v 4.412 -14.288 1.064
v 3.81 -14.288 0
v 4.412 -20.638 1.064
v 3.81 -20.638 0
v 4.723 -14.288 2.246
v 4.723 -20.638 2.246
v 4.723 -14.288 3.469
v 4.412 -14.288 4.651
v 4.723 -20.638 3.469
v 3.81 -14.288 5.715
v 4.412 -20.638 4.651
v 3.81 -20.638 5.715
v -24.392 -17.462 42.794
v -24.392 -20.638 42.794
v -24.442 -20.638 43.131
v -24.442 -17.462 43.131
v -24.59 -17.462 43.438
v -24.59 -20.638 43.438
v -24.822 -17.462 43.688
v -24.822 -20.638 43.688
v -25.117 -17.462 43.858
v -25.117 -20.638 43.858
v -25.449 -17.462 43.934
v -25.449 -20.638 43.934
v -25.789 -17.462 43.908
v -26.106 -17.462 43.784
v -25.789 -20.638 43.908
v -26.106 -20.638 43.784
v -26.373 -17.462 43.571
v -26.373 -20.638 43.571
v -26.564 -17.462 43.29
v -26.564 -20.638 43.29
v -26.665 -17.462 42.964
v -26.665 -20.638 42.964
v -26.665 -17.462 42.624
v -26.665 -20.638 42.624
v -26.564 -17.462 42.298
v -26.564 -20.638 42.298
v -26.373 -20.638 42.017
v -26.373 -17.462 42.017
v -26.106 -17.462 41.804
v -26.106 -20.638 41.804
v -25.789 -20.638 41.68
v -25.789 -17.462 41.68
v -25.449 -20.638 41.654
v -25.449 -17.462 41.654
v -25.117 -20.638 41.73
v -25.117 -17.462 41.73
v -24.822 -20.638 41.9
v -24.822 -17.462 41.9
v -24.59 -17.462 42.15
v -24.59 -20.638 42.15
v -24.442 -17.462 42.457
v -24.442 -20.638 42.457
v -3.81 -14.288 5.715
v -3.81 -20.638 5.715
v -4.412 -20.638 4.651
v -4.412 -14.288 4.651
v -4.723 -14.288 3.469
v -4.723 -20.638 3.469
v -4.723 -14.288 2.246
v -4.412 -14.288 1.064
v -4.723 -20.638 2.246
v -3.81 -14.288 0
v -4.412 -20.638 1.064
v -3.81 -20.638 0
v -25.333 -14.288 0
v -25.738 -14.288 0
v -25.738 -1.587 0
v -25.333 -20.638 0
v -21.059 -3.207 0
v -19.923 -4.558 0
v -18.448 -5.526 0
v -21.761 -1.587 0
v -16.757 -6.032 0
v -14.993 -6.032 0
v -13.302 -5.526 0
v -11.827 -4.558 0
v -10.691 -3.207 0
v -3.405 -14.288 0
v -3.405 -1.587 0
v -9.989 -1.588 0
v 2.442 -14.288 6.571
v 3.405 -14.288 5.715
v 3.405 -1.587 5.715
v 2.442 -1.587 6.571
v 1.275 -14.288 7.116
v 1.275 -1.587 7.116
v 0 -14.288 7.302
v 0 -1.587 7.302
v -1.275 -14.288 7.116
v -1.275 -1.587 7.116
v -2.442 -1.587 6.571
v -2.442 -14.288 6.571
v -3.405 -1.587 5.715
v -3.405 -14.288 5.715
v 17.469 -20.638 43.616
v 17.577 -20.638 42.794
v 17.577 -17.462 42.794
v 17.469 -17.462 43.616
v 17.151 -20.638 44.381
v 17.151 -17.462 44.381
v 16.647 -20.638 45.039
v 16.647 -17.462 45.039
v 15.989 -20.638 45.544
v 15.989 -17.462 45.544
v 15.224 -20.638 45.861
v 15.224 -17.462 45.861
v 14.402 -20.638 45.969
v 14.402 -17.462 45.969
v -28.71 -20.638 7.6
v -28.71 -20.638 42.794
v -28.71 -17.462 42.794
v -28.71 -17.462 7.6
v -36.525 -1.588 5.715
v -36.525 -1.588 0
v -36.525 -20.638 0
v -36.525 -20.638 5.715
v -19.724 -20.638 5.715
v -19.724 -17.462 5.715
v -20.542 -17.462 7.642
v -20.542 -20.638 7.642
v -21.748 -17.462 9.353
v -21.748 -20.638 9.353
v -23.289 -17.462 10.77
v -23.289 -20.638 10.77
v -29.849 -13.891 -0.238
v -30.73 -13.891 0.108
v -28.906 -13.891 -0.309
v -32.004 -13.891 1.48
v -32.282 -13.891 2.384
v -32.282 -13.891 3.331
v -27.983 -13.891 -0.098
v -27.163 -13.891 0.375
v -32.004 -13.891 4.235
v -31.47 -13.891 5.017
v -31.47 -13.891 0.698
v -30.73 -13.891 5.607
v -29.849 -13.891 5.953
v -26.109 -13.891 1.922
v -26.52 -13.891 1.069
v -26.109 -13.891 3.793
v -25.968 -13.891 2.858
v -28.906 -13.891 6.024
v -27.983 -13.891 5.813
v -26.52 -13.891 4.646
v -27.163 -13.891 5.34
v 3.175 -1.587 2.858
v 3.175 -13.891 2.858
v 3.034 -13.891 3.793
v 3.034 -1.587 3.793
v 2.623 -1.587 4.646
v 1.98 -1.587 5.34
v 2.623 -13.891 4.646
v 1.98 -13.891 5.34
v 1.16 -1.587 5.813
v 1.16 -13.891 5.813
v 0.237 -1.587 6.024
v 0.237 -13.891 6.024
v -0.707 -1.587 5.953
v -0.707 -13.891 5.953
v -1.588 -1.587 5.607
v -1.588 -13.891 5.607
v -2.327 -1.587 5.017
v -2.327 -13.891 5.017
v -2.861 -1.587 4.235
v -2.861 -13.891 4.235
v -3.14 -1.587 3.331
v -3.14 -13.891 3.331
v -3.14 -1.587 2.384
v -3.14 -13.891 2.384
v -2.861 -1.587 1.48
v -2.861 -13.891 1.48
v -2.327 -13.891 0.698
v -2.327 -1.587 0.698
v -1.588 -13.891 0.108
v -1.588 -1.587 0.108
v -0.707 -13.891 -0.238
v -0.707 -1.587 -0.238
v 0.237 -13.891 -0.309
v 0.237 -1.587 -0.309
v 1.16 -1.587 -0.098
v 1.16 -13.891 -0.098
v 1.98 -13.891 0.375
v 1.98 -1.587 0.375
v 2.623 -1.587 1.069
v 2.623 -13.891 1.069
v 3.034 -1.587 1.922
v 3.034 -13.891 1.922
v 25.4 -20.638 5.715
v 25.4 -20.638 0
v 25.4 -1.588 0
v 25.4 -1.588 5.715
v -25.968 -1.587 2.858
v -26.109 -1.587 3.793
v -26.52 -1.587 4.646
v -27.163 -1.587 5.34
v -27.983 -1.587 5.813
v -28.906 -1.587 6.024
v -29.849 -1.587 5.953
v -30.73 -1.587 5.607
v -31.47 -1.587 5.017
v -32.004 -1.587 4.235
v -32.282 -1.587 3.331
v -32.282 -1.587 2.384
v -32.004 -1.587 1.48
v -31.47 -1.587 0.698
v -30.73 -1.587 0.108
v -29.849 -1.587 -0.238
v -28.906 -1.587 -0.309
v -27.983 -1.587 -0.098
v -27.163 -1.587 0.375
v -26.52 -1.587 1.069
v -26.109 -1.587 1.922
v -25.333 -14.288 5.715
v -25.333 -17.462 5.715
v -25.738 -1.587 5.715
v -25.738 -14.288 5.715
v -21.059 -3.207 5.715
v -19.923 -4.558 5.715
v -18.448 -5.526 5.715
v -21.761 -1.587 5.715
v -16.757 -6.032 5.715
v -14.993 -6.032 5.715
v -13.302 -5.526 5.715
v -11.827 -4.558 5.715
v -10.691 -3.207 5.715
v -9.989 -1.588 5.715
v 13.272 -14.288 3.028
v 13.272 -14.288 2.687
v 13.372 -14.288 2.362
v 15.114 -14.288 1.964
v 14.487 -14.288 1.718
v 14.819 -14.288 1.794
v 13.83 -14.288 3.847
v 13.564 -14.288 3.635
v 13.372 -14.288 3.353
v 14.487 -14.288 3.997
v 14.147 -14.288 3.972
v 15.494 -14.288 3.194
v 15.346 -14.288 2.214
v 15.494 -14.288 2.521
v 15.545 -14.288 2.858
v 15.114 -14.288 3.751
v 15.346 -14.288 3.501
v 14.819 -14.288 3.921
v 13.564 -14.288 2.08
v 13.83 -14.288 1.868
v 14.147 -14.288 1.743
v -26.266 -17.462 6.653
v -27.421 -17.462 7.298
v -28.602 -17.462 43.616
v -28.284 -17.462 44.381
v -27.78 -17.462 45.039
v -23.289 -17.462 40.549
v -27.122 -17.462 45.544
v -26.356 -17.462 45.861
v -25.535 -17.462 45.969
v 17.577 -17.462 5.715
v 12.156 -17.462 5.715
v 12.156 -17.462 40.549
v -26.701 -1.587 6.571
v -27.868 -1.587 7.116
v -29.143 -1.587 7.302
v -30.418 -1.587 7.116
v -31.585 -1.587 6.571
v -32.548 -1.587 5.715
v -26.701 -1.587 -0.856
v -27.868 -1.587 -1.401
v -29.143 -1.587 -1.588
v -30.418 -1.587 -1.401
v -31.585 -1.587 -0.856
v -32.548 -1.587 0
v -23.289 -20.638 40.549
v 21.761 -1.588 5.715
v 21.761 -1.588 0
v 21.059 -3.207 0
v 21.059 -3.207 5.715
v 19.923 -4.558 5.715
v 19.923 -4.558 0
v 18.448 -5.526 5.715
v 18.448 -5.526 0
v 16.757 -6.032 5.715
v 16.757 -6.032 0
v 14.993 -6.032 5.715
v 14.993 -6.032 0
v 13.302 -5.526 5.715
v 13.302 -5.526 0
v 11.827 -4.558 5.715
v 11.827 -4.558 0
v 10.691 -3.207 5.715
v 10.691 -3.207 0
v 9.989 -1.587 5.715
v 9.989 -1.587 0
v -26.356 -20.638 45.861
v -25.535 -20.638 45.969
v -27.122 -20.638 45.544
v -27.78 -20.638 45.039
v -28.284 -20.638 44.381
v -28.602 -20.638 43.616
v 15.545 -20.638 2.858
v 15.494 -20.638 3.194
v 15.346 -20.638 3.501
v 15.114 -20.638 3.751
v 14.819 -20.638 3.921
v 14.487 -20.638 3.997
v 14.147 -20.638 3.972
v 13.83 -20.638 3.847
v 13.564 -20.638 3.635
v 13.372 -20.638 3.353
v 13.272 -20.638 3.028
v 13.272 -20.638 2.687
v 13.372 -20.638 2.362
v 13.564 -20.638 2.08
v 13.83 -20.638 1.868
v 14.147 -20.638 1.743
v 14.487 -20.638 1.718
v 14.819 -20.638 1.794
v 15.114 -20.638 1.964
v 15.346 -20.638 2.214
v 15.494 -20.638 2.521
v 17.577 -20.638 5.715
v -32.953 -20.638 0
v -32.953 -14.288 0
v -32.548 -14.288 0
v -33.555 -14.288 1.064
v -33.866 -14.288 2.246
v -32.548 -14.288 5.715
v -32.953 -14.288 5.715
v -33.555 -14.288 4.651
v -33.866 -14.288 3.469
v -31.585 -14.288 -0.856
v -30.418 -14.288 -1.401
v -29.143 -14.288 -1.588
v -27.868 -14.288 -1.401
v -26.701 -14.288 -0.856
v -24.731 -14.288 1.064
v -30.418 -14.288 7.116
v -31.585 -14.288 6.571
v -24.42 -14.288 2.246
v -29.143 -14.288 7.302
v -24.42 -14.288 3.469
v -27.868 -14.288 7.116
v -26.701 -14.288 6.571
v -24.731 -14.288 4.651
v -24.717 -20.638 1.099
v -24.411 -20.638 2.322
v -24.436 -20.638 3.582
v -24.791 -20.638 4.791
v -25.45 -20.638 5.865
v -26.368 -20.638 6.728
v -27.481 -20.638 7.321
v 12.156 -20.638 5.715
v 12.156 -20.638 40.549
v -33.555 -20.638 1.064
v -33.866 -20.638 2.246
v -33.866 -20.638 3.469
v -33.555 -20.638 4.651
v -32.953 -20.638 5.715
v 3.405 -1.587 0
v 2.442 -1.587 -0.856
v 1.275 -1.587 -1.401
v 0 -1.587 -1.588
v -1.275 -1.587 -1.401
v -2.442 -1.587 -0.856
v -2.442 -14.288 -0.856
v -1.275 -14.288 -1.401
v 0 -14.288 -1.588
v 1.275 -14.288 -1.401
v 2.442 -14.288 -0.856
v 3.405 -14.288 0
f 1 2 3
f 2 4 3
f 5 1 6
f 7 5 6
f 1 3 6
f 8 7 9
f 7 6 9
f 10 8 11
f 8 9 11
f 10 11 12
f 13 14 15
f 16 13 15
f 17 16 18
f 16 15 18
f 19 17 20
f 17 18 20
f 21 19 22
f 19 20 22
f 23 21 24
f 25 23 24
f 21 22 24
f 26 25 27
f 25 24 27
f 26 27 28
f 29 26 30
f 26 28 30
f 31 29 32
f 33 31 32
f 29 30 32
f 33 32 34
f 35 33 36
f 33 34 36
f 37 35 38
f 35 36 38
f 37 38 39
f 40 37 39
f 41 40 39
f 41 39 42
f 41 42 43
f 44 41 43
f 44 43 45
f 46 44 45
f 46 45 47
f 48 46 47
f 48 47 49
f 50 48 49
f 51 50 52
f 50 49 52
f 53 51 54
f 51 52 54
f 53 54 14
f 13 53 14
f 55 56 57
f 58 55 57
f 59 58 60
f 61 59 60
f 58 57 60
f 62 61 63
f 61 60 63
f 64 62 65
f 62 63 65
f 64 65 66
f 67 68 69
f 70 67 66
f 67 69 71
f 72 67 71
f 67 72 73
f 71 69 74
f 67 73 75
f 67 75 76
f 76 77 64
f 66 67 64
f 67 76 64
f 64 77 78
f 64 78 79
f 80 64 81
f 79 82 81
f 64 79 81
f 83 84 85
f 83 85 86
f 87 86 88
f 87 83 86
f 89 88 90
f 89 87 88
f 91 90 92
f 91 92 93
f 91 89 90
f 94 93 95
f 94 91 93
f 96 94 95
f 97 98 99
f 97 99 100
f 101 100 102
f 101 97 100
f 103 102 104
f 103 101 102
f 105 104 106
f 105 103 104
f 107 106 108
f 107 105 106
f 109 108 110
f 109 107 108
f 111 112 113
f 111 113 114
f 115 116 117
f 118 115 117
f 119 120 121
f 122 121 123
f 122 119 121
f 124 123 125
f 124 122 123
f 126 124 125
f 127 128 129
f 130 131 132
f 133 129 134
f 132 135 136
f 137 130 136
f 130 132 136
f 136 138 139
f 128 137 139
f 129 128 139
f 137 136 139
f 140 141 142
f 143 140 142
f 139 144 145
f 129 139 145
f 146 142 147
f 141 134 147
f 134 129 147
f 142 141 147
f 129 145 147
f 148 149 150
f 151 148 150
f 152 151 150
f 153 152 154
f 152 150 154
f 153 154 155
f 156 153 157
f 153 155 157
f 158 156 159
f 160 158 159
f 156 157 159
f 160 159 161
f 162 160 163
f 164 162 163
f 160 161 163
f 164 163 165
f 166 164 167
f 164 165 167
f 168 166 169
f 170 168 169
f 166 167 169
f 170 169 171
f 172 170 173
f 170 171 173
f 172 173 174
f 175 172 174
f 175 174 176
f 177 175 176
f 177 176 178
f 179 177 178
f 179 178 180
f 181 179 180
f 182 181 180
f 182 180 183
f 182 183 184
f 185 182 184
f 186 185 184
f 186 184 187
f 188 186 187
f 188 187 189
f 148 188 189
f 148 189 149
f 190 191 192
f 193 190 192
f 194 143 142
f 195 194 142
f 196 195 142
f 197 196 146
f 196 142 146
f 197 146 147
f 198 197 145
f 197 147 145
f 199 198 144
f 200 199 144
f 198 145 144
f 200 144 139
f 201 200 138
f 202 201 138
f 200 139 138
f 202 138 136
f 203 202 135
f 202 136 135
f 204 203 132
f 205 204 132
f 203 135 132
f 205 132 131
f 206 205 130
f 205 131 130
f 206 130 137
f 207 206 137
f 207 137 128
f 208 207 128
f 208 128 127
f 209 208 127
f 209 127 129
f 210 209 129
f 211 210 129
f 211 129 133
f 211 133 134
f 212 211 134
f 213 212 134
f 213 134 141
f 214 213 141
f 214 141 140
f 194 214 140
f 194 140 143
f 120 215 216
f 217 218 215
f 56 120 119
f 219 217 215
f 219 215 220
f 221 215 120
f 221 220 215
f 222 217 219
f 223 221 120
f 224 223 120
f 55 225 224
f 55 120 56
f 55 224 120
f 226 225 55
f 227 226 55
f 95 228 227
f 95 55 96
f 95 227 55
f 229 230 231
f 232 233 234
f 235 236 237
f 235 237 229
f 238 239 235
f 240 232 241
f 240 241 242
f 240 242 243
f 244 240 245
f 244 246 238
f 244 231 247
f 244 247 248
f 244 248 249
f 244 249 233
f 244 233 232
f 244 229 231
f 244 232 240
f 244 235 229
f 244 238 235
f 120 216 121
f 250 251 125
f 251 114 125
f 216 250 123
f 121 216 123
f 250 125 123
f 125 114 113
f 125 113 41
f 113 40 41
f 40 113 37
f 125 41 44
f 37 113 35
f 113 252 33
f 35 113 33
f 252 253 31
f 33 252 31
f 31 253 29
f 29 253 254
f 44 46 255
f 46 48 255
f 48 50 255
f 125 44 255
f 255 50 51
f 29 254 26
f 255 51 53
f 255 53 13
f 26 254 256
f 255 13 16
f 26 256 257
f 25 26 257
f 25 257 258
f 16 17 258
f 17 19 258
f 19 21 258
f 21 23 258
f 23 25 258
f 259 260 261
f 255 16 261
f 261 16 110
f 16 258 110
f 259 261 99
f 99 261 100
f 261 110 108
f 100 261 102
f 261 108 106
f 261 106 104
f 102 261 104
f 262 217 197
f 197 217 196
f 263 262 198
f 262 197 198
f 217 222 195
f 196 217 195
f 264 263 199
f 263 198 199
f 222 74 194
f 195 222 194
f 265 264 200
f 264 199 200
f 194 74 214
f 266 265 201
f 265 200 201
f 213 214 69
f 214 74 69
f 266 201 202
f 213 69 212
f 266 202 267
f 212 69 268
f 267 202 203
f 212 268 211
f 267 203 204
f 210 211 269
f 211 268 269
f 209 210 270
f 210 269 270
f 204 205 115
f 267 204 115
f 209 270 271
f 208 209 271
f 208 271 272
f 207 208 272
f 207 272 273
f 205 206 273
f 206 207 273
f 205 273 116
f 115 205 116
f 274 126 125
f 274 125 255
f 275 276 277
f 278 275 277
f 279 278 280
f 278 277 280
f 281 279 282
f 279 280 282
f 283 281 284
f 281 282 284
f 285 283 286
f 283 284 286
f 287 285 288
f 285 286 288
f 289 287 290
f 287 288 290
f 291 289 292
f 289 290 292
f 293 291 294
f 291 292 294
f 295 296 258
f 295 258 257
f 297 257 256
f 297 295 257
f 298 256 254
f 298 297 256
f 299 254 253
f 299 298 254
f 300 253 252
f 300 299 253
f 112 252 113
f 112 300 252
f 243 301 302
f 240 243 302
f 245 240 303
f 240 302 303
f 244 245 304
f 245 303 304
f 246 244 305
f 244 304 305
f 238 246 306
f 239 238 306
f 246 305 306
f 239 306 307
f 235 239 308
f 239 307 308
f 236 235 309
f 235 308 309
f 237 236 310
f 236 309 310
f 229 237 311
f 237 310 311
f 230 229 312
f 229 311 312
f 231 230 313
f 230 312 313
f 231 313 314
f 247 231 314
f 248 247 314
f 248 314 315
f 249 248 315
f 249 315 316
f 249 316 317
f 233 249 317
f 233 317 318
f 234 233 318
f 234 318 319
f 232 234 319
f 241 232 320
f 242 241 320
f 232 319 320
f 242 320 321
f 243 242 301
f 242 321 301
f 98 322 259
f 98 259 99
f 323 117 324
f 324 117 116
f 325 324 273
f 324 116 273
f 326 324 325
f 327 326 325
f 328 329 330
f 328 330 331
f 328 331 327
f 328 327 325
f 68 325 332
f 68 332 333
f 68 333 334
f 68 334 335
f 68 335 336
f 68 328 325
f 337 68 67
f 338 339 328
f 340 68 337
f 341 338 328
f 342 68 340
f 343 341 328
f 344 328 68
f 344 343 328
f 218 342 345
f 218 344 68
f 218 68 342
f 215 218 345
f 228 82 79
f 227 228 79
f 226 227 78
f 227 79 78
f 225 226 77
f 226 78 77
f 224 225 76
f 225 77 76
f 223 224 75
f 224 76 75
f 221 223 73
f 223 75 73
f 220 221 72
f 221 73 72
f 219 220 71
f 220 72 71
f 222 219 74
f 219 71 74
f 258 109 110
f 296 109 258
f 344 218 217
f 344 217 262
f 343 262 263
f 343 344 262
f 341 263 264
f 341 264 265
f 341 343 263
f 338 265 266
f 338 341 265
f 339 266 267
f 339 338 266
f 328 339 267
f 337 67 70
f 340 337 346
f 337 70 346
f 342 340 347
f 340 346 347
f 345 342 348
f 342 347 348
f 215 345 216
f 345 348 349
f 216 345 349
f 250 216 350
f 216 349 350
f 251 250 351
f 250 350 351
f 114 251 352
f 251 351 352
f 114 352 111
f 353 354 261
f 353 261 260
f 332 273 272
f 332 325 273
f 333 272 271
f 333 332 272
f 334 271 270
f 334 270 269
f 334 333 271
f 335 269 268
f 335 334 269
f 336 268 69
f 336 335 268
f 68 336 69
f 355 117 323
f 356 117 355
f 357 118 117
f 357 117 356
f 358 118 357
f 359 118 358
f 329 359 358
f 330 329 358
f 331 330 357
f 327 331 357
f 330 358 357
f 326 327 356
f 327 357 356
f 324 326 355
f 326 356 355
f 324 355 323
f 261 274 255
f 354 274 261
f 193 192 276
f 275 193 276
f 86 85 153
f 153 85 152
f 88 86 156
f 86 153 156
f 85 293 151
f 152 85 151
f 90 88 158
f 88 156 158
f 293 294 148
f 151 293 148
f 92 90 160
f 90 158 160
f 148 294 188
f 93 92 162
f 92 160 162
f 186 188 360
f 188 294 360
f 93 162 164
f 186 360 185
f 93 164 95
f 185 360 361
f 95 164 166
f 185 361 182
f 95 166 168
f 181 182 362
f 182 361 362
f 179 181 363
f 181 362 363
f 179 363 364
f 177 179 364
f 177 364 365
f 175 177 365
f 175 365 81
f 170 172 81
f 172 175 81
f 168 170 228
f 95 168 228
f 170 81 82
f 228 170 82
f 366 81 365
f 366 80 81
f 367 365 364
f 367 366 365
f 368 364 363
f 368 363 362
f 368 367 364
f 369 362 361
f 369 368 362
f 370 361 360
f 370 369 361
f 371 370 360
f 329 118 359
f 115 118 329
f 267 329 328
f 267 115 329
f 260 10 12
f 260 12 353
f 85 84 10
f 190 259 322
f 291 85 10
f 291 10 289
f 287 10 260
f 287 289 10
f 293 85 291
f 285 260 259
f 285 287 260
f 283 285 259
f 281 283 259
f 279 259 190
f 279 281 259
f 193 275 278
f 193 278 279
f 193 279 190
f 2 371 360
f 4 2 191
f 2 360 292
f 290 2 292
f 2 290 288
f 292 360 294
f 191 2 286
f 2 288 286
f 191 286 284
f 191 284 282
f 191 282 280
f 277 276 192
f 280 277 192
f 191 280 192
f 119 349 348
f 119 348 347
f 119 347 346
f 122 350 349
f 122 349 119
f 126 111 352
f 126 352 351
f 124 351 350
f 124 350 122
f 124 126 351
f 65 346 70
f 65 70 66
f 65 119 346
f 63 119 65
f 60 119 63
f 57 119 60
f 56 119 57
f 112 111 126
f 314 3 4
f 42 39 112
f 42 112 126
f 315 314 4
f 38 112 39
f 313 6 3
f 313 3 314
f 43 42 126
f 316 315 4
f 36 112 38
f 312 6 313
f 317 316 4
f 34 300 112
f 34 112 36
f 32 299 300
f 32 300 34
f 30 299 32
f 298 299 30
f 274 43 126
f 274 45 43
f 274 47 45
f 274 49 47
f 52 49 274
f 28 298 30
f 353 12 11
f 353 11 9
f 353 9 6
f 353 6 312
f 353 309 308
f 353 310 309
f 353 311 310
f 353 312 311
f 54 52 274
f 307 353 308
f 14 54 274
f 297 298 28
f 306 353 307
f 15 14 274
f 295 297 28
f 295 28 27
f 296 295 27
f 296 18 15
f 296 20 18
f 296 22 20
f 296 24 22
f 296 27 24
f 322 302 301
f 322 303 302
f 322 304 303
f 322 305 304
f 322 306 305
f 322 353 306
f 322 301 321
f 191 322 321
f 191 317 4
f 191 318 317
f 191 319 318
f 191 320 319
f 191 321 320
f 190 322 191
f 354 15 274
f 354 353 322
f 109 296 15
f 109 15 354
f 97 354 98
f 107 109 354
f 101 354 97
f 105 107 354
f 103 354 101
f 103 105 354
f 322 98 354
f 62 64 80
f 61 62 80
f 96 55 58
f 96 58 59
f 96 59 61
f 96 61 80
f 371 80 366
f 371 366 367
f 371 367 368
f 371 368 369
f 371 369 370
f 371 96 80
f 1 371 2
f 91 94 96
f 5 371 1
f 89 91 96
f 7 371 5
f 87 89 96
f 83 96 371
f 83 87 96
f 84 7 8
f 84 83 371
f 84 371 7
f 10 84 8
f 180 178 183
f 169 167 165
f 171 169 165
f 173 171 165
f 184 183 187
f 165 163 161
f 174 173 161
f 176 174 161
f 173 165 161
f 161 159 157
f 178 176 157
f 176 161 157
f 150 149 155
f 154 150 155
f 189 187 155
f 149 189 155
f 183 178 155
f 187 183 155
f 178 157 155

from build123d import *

# Parameters (mm, degrees)
F1_DEPTH  = 5.715
F2_R      = 1.143
F3_DEPTH  = 3.175
F5_R      = 4.445
F6_DEPTH  = 19.05
F4_R      = 3.175
F7_DEPTH  = 19.05
F8_R      = 4.7625
F9_DEPTH  = 6.35
F10_R     = 1.143
F11_DEPTH = 6.35
F13_DEPTH = 3.175
F14_R     = 3.175
F15_DEPTH = 0.396875


with BuildPart() as f1:
    # F0 (on Top) → F1 (new body)
    with BuildSketch(Plane.XY):
        with BuildLine():
            ThreePointArc((-9.989334, -1.5875), (-15.875, -6.096), (-21.760666, -1.5875))
            Line((-21.760666, -1.5875), (-36.5252, -1.5875))
            Line((-36.5252, -1.5875), (-36.5252, -20.6375))
            Line((-36.5252, -20.6375), (25.4, -20.6375))
            Line((25.4, -20.6375), (25.4, -1.5875))
            Line((25.4, -1.5875), (21.760666, -1.5875))
            ThreePointArc((21.760666, -1.5875), (15.875, -6.096), (9.989334, -1.5875))
            Line((9.989334, -1.5875), (-9.989334, -1.5875))
        make_face()
    extrude(amount=F1_DEPTH)

    # F2 (on face) → F3 (join)
    with BuildSketch(Plane.XZ.offset(20.6375)):
        with BuildLine():
            ThreePointArc((-25.53469, 45.96899), (-27.779754, 45.039054), (-28.70969, 42.79399))
            Line((-28.70969, 42.79399), (-28.70969, 5.715))
            Line((-28.70969, 5.715), (-23.289328, 5.715))
            Line((-23.289328, 5.715), (-23.289328, 40.549224))
            Line((-23.289328, 40.549224), (12.156438, 40.549224))
            Line((12.156438, 40.549224), (12.156438, 5.715))
            Line((12.156438, 5.715), (17.5768, 5.715))
            Line((17.5768, 5.715), (17.5768, 42.79399))
            ThreePointArc((17.5768, 42.79399), (16.646864, 45.039054), (14.4018, 45.96899))
            Line((14.4018, 45.96899), (-25.53469, 45.96899))
        make_face()
        with Locations((-25.53469, 42.79399)):
            Circle(F2_R, mode=Mode.SUBTRACT)
        with Locations((14.4018, 2.8575)):
            Circle(F2_R)
    extrude(amount=-F3_DEPTH)

    # F5 (on face) → F6 (join, through all)
    with BuildSketch(Plane.XZ.offset(20.6375)):
        with Locations((-29.142933, 2.8575)):
            Circle(F5_R)
        with Locations((0, 2.8575)):
            Circle(F5_R)
    extrude(amount=-F6_DEPTH)

    # F4 (on face) → F7 (cut, through all)
    with BuildSketch(Plane.XZ.offset(20.6375)):
        with Locations((-29.142933, 2.8575)):
            Circle(F4_R)
        with Locations((0, 2.8575)):
            Circle(F4_R)
    extrude(amount=-F7_DEPTH, mode=Mode.SUBTRACT)

    # F8 (on face) → F9 (cut)
    with BuildSketch(Plane.XZ.offset(20.6375)):
        with Locations((-29.142933, 2.8575)):
            Circle(F8_R)
        with Locations((0, 2.8575)):
            Circle(F8_R)
    extrude(amount=-F9_DEPTH, mode=Mode.SUBTRACT)

    # F10 (on face) → F11 (cut)
    with BuildSketch(Plane.XZ.offset(20.6375)):
        with Locations((14.4018, 2.8575)):
            Circle(F10_R)
    extrude(amount=-F11_DEPTH, mode=Mode.SUBTRACT)

    # F12 (on face) → F13 (join, through all)
    with BuildSketch(Plane.XZ.offset(20.6375)):
        with BuildLine():
            Line((-25.332933, 0), (-19.724361, 0))
            ThreePointArc((-19.724361, 0), (-21.110093, 8.545056), (-28.70969, 12.69046))
            Line((-28.70969, 12.69046), (-28.70969, 7.600253))
            ThreePointArc((-28.70969, 7.600253), (-24.790664, 4.791192), (-25.332933, 0))
        make_face()
    extrude(amount=-F13_DEPTH)

    # F14 (on face) → F15 (join)
    with BuildSketch(Plane.XZ.offset(14.2875)):
        with Locations((0, 2.8575)):
            Circle(F14_R)
        with Locations((-29.142933, 2.8575)):
            Circle(F14_R)
    extrude(amount=-F15_DEPTH)


solid = f1.part
